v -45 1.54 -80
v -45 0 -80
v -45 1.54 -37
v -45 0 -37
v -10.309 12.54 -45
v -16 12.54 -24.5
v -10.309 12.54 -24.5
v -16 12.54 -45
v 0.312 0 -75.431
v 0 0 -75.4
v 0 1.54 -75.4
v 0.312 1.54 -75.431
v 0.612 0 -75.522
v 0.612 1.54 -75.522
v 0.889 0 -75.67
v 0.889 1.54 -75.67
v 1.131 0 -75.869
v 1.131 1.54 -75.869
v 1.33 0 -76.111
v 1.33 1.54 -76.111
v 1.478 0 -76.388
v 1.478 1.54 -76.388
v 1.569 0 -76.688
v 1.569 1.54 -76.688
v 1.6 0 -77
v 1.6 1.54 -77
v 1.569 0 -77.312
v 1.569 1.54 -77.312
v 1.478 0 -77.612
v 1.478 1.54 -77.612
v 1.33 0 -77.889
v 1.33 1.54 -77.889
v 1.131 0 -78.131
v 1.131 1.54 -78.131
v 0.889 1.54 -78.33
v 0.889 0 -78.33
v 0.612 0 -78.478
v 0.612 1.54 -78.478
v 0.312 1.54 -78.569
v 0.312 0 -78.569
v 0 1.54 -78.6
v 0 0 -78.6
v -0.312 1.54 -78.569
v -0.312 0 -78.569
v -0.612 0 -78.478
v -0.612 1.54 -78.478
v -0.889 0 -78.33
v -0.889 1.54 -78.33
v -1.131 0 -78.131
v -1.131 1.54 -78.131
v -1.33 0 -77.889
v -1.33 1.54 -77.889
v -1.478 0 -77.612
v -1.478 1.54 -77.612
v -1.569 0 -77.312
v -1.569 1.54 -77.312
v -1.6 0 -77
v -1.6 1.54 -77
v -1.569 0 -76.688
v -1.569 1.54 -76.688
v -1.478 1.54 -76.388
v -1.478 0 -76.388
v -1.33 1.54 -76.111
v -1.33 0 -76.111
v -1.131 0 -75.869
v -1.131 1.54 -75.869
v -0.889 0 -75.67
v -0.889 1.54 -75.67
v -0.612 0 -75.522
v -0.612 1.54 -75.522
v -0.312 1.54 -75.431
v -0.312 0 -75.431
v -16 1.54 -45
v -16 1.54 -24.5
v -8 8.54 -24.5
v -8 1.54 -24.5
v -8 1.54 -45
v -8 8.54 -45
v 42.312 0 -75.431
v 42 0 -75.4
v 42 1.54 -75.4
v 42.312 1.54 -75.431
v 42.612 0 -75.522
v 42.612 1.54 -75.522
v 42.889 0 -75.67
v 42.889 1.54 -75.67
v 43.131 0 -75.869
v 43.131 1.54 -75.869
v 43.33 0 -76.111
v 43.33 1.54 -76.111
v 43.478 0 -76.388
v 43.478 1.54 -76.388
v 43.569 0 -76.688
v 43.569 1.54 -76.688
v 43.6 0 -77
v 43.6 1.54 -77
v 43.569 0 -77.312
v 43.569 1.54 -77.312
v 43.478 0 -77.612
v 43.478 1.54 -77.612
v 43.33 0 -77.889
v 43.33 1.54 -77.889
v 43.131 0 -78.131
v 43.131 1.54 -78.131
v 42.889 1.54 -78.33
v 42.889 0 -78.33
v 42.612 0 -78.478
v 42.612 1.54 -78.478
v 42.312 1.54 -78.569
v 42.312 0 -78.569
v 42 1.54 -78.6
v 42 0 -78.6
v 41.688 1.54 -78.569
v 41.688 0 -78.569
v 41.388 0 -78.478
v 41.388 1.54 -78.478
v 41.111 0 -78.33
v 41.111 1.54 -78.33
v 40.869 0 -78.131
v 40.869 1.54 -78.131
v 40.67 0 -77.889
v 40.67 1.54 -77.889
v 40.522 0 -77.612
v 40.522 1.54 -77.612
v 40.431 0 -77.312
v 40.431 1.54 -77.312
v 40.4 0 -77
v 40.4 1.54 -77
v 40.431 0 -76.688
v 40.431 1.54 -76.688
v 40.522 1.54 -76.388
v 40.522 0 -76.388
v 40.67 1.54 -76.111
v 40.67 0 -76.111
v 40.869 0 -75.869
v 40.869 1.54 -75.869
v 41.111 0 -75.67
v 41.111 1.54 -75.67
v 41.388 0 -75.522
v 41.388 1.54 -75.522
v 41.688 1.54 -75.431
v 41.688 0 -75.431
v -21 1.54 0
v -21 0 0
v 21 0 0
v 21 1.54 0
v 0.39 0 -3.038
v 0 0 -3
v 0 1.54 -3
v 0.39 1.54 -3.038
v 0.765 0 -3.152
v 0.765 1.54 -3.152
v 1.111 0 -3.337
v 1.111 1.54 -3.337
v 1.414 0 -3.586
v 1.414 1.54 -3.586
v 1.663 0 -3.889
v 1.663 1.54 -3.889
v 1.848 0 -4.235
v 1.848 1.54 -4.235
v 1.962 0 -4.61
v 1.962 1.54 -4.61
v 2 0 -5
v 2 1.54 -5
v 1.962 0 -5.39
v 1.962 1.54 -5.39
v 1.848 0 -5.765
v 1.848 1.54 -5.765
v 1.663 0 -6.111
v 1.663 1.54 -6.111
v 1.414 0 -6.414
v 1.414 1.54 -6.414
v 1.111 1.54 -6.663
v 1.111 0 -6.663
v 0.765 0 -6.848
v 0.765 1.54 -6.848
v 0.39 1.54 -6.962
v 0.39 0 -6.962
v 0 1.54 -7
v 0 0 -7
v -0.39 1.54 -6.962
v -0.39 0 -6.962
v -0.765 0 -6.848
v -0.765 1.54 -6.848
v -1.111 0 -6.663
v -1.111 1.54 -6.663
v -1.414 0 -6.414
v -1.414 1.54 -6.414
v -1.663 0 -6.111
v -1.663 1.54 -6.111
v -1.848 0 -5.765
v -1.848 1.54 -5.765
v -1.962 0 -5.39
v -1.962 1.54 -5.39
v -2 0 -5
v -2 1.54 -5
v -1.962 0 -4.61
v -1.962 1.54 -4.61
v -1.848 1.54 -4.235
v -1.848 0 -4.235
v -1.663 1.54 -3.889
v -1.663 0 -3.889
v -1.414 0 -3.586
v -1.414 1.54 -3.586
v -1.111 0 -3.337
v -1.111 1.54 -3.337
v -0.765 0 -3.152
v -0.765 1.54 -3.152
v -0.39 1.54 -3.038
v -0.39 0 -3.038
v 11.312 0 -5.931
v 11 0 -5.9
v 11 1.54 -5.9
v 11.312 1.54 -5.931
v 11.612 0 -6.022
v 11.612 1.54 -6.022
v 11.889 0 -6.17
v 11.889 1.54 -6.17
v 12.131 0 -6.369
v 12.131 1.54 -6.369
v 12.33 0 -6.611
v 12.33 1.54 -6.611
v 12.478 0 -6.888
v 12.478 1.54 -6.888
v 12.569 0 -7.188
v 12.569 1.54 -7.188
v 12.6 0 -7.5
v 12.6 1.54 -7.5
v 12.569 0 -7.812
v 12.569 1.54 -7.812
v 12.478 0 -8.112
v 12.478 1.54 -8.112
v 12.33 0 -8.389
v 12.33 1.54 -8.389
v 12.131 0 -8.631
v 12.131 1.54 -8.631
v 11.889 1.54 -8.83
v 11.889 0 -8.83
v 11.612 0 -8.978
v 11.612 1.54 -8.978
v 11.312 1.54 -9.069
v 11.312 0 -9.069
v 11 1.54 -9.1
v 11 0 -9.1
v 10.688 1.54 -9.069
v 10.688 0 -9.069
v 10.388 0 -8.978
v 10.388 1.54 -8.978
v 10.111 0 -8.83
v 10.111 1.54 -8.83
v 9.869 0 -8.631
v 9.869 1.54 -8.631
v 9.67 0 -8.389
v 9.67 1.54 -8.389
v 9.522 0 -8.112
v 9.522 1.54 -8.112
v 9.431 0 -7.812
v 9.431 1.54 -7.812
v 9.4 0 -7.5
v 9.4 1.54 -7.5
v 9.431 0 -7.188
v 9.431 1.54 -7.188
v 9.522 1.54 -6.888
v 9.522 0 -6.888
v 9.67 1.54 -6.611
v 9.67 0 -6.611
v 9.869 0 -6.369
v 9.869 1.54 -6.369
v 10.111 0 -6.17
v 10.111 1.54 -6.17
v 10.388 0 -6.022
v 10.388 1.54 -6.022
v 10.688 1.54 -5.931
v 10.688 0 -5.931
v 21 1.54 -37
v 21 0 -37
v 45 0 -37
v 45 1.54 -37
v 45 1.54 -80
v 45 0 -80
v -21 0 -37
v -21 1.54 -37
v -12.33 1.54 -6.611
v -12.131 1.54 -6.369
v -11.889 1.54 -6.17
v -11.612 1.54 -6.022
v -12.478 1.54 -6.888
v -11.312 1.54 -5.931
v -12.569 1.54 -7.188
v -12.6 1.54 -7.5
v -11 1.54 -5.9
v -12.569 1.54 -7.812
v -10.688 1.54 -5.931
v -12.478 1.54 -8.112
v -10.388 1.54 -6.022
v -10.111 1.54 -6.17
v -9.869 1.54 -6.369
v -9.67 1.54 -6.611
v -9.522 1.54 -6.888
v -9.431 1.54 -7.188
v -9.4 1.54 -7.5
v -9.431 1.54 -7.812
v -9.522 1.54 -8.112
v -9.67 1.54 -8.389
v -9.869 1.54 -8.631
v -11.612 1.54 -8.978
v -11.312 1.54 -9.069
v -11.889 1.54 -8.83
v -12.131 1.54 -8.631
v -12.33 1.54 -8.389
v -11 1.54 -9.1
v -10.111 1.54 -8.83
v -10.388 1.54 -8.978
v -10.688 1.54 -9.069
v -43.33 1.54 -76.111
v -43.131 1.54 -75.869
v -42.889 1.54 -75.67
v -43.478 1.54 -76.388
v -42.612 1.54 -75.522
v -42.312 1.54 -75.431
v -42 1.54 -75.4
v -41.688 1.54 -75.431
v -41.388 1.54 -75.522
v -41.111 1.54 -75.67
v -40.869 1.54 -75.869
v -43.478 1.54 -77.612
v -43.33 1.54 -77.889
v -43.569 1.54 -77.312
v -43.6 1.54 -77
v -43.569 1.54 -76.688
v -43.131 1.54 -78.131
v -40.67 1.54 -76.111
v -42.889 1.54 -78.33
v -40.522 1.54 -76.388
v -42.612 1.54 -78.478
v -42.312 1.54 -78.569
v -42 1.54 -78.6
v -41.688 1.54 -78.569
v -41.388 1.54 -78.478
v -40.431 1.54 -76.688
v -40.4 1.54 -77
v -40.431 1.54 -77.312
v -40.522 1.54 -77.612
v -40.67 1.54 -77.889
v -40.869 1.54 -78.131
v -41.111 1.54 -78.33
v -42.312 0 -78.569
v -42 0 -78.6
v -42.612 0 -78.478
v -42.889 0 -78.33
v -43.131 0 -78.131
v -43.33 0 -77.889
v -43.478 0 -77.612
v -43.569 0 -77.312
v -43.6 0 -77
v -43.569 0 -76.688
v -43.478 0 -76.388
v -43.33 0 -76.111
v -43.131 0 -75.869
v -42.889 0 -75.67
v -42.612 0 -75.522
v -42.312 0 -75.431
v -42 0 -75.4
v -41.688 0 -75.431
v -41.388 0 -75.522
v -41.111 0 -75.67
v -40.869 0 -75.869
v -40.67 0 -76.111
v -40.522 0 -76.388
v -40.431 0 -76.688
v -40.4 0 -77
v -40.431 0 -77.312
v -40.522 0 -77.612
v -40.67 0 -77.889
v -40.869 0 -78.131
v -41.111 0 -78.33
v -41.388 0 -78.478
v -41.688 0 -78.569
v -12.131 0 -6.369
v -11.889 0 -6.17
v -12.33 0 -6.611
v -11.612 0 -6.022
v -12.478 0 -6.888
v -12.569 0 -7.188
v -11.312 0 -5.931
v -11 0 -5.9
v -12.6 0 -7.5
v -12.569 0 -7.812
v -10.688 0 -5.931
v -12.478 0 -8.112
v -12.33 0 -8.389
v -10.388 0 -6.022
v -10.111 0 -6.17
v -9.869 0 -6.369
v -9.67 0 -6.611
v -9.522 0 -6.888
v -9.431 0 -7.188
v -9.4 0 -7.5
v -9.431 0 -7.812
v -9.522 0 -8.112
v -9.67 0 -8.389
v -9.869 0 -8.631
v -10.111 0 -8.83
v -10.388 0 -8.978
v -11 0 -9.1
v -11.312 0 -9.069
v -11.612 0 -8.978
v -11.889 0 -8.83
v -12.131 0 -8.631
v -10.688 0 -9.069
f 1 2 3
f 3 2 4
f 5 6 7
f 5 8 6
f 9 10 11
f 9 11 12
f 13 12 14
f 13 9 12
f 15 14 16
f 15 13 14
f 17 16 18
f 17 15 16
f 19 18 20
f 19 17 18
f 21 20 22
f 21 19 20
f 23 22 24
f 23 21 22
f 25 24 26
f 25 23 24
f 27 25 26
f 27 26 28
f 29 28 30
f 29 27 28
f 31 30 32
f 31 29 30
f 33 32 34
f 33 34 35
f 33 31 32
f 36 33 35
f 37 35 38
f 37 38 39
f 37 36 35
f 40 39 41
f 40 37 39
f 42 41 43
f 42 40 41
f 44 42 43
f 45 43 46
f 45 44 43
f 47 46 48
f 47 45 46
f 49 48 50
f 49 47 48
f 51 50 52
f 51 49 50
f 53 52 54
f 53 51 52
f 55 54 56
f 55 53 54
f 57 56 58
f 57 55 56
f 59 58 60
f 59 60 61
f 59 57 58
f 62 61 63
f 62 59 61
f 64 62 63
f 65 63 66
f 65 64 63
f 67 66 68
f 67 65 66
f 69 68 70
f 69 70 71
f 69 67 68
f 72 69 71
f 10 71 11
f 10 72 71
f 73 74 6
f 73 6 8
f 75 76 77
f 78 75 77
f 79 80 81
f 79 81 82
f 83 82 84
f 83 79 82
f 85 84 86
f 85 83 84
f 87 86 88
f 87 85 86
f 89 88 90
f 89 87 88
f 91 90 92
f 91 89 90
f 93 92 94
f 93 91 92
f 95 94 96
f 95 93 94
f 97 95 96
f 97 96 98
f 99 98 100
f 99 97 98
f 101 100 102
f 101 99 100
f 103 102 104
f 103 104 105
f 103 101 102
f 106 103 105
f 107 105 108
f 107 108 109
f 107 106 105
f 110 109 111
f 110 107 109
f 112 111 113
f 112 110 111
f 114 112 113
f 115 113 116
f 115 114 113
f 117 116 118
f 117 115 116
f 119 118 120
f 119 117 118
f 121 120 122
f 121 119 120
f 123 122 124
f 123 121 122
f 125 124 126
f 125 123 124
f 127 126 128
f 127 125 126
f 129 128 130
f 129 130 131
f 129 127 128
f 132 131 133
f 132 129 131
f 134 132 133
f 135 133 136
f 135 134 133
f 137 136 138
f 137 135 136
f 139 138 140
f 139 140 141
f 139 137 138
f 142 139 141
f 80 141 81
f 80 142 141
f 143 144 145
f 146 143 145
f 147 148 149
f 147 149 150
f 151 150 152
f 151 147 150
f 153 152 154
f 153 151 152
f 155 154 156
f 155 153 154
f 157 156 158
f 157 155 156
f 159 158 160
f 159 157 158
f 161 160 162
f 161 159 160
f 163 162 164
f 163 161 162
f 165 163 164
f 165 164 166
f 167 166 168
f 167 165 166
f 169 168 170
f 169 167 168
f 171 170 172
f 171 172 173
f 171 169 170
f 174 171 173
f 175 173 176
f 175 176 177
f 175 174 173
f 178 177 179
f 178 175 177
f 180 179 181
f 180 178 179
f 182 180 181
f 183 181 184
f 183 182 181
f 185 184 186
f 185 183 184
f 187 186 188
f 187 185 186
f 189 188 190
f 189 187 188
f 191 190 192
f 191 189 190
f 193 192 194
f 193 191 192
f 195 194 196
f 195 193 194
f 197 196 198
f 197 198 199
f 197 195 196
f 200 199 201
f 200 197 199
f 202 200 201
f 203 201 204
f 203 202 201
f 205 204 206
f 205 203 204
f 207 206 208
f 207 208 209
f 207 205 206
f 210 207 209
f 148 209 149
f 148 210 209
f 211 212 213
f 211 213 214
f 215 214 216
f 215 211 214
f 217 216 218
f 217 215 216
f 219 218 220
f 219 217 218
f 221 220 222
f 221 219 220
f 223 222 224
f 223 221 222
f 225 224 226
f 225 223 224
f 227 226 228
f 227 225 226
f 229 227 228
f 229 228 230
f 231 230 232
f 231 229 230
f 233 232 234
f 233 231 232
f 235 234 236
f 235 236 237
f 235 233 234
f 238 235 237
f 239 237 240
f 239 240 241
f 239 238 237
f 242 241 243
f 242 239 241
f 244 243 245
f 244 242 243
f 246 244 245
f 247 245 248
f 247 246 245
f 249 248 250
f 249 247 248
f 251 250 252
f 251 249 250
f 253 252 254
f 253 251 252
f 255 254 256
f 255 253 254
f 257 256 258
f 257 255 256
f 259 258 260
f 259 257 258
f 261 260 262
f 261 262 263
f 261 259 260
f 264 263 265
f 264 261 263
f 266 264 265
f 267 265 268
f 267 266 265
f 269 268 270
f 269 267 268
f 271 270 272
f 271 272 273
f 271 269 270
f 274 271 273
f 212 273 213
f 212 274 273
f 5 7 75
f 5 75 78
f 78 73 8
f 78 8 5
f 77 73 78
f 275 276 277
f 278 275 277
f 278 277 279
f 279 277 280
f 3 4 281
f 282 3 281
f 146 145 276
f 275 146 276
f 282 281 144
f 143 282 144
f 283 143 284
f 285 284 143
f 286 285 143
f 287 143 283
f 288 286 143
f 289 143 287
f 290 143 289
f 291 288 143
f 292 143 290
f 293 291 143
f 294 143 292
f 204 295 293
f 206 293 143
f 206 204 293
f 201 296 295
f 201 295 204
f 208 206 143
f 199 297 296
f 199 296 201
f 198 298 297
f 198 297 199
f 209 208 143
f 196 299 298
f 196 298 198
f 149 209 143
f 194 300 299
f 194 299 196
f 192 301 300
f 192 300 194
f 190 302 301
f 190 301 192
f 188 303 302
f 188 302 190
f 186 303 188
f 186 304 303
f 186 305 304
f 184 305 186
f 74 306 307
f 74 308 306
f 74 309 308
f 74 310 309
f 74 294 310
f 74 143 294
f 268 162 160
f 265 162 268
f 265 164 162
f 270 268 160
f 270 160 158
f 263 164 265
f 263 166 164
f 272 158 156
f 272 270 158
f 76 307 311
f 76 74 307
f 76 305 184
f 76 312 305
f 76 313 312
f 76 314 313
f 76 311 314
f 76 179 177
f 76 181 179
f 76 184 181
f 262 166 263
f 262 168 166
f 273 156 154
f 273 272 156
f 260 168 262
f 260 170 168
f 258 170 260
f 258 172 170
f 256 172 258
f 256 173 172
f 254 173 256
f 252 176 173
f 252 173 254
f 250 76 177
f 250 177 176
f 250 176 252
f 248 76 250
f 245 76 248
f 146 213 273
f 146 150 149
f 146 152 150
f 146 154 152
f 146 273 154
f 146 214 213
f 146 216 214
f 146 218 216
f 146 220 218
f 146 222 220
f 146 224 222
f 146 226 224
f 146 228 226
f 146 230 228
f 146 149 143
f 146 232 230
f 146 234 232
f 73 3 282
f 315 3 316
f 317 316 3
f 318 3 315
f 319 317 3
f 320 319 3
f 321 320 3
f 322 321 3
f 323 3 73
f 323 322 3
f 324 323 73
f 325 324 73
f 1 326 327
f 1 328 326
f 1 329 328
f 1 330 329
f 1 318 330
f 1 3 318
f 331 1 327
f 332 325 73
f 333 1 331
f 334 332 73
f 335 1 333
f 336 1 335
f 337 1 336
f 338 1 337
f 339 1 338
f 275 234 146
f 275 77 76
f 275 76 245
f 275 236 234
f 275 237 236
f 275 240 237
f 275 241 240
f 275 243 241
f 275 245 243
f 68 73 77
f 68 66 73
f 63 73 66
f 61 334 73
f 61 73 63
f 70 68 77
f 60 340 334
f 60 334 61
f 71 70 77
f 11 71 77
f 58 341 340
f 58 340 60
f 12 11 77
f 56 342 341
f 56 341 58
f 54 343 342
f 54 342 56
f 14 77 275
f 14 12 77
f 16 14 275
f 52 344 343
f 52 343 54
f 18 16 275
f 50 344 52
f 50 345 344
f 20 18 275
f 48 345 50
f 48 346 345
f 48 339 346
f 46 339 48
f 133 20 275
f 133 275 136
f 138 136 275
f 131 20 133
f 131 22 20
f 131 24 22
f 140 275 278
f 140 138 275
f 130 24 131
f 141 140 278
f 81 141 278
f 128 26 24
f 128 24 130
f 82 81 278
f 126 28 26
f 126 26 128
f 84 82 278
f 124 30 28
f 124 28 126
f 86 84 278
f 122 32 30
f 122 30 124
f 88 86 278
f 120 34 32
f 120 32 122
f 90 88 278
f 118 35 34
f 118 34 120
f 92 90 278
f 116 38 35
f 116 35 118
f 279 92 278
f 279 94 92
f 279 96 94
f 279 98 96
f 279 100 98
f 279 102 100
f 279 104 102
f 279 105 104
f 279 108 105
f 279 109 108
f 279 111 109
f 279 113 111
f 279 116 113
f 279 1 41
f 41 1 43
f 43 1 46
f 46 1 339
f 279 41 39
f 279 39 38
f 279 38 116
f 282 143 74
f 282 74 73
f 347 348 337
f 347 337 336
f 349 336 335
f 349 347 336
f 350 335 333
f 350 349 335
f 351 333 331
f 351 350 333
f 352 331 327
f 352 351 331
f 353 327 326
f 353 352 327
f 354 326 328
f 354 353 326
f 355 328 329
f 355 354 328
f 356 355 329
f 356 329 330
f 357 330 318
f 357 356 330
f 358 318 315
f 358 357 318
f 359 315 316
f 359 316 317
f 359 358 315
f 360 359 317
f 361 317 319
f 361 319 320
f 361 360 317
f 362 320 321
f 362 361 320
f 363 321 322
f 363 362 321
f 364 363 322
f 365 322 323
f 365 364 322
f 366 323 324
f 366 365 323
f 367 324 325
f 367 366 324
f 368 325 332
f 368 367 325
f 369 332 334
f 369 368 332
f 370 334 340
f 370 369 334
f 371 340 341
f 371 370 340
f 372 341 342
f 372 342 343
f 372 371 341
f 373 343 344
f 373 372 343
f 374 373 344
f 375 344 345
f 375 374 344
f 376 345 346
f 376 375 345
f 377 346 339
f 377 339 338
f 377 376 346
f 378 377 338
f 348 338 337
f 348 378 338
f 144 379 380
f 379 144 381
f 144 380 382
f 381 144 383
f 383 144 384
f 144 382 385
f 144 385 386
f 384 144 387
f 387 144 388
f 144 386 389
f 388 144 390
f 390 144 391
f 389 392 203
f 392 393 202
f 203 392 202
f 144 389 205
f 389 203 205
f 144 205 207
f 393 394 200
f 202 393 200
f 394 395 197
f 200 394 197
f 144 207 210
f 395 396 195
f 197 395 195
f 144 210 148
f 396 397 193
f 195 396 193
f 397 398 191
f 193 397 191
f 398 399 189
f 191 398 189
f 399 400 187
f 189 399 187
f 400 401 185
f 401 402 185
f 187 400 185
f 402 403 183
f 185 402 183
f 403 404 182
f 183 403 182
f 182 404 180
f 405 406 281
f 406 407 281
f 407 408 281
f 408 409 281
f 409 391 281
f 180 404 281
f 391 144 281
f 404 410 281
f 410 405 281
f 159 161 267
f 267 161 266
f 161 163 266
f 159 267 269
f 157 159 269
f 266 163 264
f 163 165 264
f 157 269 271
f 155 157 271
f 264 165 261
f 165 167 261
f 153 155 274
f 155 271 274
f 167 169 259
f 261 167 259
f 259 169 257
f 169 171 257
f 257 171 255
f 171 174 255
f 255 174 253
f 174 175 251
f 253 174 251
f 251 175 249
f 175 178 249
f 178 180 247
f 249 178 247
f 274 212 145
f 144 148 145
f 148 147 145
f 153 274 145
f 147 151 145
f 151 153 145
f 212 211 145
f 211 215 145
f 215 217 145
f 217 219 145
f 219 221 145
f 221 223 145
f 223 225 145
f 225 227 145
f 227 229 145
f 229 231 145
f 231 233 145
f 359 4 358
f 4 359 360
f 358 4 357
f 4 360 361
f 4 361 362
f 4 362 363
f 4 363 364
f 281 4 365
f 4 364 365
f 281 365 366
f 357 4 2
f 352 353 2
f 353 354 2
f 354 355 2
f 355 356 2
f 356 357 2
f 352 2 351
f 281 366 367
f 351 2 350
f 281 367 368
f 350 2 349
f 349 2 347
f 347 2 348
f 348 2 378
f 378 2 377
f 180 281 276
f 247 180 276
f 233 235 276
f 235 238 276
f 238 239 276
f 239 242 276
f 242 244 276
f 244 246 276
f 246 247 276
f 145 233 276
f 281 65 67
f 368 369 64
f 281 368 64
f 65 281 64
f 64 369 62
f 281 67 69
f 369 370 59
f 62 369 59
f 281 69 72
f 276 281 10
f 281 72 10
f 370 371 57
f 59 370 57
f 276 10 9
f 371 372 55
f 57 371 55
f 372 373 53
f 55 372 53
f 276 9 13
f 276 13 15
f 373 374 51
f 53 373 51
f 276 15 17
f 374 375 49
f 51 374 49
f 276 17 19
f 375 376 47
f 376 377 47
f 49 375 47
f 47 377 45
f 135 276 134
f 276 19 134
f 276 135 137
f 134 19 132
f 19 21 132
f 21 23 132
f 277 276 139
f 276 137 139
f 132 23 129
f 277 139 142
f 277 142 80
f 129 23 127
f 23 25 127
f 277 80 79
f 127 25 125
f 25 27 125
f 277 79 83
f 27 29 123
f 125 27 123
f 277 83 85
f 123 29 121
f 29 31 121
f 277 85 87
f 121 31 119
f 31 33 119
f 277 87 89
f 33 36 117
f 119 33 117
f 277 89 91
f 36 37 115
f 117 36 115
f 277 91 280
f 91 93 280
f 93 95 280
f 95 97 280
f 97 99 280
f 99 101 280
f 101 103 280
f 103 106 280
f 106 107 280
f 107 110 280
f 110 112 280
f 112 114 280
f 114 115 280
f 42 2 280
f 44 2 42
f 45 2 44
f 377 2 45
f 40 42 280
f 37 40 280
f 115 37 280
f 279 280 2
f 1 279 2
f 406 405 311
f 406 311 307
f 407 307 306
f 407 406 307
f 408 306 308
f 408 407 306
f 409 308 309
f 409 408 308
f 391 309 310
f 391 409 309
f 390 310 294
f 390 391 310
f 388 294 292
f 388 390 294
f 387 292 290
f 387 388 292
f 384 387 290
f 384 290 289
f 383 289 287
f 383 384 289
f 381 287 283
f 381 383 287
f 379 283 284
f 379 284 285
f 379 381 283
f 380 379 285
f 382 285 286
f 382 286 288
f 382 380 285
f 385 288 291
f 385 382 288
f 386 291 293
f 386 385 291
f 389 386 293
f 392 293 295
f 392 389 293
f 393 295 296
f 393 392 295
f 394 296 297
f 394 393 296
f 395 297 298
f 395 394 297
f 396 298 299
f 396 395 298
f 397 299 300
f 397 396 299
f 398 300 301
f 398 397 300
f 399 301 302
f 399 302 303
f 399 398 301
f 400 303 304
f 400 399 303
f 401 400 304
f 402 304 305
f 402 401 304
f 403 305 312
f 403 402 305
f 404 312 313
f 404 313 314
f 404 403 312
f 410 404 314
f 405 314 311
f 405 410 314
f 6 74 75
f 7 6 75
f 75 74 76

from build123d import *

# Parameters (mm, degrees)
SKETCH_1_R      = 1.6
SKETCH_1_R_2    = 2
EXTRUDE_1_DEPTH = 1.54
SKETCH_2_W      = 8
SKETCH_2_H      = 20.5
EXTRUDE_2_DEPTH = 11
CHAMFER_1_SIZE  = 4
CHAMFER_1_SIZE2 = 2.309401077


with BuildPart() as part:
    # Эскиз1 → Бобышка-Вытянуть1 (new body)
    with BuildSketch(Plane(origin=(0, 0, 0), x_dir=(1, 0, 0), z_dir=(0, 1, 0))):
        Polygon((-21, 0), (21, 0), (21, 37), (45, 37), (45, 80), (-45, 80), (-45, 37), (-21, 37), align=None)
        with Locations(Location((11, 7.5, 0), (0, 0, 270))):
            Circle(SKETCH_1_R, mode=Mode.SUBTRACT)
        with Locations(Location((42, 77, 0), (0, 0, 270))):
            Circle(SKETCH_1_R, mode=Mode.SUBTRACT)
        with Locations(Location((0, 77, 0), (0, 0, 270))):
            Circle(SKETCH_1_R, mode=Mode.SUBTRACT)
        with Locations(Location((0, 5, 0), (0, 0, 270))):
            Circle(SKETCH_1_R_2, mode=Mode.SUBTRACT)
        with Locations(Location((-42, 77, 0), (0, 0, 90))):
            Circle(SKETCH_1_R, mode=Mode.SUBTRACT)
        with Locations(Location((-11, 7.5, 0), (0, 0, 90))):
            Circle(SKETCH_1_R, mode=Mode.SUBTRACT)
    extrude(amount=EXTRUDE_1_DEPTH)

    # Эскиз2 → Бобышка-Вытянуть2 (add)
    with BuildSketch(Plane(origin=(0, 1.54, 0), x_dir=(1, 0, 0), z_dir=(0, 1, 0))):
        with Locations((-12, 34.75)):
            Rectangle(SKETCH_2_W, SKETCH_2_H)
    extrude(amount=EXTRUDE_2_DEPTH)

    # Фаска1
    chamfer_1_edges = [part.edges().sort_by_distance(p)[0] for p in [
        (-8, 12.54, -34.75),
    ]]
    chamfer_1_side = [part.faces().sort_by_distance(p)[0] for p in [
        (-8, 7.04, -34.75),
    ]]
    chamfer(chamfer_1_edges, length=CHAMFER_1_SIZE, length2=CHAMFER_1_SIZE2, reference=chamfer_1_side[0])


solid = part.part
